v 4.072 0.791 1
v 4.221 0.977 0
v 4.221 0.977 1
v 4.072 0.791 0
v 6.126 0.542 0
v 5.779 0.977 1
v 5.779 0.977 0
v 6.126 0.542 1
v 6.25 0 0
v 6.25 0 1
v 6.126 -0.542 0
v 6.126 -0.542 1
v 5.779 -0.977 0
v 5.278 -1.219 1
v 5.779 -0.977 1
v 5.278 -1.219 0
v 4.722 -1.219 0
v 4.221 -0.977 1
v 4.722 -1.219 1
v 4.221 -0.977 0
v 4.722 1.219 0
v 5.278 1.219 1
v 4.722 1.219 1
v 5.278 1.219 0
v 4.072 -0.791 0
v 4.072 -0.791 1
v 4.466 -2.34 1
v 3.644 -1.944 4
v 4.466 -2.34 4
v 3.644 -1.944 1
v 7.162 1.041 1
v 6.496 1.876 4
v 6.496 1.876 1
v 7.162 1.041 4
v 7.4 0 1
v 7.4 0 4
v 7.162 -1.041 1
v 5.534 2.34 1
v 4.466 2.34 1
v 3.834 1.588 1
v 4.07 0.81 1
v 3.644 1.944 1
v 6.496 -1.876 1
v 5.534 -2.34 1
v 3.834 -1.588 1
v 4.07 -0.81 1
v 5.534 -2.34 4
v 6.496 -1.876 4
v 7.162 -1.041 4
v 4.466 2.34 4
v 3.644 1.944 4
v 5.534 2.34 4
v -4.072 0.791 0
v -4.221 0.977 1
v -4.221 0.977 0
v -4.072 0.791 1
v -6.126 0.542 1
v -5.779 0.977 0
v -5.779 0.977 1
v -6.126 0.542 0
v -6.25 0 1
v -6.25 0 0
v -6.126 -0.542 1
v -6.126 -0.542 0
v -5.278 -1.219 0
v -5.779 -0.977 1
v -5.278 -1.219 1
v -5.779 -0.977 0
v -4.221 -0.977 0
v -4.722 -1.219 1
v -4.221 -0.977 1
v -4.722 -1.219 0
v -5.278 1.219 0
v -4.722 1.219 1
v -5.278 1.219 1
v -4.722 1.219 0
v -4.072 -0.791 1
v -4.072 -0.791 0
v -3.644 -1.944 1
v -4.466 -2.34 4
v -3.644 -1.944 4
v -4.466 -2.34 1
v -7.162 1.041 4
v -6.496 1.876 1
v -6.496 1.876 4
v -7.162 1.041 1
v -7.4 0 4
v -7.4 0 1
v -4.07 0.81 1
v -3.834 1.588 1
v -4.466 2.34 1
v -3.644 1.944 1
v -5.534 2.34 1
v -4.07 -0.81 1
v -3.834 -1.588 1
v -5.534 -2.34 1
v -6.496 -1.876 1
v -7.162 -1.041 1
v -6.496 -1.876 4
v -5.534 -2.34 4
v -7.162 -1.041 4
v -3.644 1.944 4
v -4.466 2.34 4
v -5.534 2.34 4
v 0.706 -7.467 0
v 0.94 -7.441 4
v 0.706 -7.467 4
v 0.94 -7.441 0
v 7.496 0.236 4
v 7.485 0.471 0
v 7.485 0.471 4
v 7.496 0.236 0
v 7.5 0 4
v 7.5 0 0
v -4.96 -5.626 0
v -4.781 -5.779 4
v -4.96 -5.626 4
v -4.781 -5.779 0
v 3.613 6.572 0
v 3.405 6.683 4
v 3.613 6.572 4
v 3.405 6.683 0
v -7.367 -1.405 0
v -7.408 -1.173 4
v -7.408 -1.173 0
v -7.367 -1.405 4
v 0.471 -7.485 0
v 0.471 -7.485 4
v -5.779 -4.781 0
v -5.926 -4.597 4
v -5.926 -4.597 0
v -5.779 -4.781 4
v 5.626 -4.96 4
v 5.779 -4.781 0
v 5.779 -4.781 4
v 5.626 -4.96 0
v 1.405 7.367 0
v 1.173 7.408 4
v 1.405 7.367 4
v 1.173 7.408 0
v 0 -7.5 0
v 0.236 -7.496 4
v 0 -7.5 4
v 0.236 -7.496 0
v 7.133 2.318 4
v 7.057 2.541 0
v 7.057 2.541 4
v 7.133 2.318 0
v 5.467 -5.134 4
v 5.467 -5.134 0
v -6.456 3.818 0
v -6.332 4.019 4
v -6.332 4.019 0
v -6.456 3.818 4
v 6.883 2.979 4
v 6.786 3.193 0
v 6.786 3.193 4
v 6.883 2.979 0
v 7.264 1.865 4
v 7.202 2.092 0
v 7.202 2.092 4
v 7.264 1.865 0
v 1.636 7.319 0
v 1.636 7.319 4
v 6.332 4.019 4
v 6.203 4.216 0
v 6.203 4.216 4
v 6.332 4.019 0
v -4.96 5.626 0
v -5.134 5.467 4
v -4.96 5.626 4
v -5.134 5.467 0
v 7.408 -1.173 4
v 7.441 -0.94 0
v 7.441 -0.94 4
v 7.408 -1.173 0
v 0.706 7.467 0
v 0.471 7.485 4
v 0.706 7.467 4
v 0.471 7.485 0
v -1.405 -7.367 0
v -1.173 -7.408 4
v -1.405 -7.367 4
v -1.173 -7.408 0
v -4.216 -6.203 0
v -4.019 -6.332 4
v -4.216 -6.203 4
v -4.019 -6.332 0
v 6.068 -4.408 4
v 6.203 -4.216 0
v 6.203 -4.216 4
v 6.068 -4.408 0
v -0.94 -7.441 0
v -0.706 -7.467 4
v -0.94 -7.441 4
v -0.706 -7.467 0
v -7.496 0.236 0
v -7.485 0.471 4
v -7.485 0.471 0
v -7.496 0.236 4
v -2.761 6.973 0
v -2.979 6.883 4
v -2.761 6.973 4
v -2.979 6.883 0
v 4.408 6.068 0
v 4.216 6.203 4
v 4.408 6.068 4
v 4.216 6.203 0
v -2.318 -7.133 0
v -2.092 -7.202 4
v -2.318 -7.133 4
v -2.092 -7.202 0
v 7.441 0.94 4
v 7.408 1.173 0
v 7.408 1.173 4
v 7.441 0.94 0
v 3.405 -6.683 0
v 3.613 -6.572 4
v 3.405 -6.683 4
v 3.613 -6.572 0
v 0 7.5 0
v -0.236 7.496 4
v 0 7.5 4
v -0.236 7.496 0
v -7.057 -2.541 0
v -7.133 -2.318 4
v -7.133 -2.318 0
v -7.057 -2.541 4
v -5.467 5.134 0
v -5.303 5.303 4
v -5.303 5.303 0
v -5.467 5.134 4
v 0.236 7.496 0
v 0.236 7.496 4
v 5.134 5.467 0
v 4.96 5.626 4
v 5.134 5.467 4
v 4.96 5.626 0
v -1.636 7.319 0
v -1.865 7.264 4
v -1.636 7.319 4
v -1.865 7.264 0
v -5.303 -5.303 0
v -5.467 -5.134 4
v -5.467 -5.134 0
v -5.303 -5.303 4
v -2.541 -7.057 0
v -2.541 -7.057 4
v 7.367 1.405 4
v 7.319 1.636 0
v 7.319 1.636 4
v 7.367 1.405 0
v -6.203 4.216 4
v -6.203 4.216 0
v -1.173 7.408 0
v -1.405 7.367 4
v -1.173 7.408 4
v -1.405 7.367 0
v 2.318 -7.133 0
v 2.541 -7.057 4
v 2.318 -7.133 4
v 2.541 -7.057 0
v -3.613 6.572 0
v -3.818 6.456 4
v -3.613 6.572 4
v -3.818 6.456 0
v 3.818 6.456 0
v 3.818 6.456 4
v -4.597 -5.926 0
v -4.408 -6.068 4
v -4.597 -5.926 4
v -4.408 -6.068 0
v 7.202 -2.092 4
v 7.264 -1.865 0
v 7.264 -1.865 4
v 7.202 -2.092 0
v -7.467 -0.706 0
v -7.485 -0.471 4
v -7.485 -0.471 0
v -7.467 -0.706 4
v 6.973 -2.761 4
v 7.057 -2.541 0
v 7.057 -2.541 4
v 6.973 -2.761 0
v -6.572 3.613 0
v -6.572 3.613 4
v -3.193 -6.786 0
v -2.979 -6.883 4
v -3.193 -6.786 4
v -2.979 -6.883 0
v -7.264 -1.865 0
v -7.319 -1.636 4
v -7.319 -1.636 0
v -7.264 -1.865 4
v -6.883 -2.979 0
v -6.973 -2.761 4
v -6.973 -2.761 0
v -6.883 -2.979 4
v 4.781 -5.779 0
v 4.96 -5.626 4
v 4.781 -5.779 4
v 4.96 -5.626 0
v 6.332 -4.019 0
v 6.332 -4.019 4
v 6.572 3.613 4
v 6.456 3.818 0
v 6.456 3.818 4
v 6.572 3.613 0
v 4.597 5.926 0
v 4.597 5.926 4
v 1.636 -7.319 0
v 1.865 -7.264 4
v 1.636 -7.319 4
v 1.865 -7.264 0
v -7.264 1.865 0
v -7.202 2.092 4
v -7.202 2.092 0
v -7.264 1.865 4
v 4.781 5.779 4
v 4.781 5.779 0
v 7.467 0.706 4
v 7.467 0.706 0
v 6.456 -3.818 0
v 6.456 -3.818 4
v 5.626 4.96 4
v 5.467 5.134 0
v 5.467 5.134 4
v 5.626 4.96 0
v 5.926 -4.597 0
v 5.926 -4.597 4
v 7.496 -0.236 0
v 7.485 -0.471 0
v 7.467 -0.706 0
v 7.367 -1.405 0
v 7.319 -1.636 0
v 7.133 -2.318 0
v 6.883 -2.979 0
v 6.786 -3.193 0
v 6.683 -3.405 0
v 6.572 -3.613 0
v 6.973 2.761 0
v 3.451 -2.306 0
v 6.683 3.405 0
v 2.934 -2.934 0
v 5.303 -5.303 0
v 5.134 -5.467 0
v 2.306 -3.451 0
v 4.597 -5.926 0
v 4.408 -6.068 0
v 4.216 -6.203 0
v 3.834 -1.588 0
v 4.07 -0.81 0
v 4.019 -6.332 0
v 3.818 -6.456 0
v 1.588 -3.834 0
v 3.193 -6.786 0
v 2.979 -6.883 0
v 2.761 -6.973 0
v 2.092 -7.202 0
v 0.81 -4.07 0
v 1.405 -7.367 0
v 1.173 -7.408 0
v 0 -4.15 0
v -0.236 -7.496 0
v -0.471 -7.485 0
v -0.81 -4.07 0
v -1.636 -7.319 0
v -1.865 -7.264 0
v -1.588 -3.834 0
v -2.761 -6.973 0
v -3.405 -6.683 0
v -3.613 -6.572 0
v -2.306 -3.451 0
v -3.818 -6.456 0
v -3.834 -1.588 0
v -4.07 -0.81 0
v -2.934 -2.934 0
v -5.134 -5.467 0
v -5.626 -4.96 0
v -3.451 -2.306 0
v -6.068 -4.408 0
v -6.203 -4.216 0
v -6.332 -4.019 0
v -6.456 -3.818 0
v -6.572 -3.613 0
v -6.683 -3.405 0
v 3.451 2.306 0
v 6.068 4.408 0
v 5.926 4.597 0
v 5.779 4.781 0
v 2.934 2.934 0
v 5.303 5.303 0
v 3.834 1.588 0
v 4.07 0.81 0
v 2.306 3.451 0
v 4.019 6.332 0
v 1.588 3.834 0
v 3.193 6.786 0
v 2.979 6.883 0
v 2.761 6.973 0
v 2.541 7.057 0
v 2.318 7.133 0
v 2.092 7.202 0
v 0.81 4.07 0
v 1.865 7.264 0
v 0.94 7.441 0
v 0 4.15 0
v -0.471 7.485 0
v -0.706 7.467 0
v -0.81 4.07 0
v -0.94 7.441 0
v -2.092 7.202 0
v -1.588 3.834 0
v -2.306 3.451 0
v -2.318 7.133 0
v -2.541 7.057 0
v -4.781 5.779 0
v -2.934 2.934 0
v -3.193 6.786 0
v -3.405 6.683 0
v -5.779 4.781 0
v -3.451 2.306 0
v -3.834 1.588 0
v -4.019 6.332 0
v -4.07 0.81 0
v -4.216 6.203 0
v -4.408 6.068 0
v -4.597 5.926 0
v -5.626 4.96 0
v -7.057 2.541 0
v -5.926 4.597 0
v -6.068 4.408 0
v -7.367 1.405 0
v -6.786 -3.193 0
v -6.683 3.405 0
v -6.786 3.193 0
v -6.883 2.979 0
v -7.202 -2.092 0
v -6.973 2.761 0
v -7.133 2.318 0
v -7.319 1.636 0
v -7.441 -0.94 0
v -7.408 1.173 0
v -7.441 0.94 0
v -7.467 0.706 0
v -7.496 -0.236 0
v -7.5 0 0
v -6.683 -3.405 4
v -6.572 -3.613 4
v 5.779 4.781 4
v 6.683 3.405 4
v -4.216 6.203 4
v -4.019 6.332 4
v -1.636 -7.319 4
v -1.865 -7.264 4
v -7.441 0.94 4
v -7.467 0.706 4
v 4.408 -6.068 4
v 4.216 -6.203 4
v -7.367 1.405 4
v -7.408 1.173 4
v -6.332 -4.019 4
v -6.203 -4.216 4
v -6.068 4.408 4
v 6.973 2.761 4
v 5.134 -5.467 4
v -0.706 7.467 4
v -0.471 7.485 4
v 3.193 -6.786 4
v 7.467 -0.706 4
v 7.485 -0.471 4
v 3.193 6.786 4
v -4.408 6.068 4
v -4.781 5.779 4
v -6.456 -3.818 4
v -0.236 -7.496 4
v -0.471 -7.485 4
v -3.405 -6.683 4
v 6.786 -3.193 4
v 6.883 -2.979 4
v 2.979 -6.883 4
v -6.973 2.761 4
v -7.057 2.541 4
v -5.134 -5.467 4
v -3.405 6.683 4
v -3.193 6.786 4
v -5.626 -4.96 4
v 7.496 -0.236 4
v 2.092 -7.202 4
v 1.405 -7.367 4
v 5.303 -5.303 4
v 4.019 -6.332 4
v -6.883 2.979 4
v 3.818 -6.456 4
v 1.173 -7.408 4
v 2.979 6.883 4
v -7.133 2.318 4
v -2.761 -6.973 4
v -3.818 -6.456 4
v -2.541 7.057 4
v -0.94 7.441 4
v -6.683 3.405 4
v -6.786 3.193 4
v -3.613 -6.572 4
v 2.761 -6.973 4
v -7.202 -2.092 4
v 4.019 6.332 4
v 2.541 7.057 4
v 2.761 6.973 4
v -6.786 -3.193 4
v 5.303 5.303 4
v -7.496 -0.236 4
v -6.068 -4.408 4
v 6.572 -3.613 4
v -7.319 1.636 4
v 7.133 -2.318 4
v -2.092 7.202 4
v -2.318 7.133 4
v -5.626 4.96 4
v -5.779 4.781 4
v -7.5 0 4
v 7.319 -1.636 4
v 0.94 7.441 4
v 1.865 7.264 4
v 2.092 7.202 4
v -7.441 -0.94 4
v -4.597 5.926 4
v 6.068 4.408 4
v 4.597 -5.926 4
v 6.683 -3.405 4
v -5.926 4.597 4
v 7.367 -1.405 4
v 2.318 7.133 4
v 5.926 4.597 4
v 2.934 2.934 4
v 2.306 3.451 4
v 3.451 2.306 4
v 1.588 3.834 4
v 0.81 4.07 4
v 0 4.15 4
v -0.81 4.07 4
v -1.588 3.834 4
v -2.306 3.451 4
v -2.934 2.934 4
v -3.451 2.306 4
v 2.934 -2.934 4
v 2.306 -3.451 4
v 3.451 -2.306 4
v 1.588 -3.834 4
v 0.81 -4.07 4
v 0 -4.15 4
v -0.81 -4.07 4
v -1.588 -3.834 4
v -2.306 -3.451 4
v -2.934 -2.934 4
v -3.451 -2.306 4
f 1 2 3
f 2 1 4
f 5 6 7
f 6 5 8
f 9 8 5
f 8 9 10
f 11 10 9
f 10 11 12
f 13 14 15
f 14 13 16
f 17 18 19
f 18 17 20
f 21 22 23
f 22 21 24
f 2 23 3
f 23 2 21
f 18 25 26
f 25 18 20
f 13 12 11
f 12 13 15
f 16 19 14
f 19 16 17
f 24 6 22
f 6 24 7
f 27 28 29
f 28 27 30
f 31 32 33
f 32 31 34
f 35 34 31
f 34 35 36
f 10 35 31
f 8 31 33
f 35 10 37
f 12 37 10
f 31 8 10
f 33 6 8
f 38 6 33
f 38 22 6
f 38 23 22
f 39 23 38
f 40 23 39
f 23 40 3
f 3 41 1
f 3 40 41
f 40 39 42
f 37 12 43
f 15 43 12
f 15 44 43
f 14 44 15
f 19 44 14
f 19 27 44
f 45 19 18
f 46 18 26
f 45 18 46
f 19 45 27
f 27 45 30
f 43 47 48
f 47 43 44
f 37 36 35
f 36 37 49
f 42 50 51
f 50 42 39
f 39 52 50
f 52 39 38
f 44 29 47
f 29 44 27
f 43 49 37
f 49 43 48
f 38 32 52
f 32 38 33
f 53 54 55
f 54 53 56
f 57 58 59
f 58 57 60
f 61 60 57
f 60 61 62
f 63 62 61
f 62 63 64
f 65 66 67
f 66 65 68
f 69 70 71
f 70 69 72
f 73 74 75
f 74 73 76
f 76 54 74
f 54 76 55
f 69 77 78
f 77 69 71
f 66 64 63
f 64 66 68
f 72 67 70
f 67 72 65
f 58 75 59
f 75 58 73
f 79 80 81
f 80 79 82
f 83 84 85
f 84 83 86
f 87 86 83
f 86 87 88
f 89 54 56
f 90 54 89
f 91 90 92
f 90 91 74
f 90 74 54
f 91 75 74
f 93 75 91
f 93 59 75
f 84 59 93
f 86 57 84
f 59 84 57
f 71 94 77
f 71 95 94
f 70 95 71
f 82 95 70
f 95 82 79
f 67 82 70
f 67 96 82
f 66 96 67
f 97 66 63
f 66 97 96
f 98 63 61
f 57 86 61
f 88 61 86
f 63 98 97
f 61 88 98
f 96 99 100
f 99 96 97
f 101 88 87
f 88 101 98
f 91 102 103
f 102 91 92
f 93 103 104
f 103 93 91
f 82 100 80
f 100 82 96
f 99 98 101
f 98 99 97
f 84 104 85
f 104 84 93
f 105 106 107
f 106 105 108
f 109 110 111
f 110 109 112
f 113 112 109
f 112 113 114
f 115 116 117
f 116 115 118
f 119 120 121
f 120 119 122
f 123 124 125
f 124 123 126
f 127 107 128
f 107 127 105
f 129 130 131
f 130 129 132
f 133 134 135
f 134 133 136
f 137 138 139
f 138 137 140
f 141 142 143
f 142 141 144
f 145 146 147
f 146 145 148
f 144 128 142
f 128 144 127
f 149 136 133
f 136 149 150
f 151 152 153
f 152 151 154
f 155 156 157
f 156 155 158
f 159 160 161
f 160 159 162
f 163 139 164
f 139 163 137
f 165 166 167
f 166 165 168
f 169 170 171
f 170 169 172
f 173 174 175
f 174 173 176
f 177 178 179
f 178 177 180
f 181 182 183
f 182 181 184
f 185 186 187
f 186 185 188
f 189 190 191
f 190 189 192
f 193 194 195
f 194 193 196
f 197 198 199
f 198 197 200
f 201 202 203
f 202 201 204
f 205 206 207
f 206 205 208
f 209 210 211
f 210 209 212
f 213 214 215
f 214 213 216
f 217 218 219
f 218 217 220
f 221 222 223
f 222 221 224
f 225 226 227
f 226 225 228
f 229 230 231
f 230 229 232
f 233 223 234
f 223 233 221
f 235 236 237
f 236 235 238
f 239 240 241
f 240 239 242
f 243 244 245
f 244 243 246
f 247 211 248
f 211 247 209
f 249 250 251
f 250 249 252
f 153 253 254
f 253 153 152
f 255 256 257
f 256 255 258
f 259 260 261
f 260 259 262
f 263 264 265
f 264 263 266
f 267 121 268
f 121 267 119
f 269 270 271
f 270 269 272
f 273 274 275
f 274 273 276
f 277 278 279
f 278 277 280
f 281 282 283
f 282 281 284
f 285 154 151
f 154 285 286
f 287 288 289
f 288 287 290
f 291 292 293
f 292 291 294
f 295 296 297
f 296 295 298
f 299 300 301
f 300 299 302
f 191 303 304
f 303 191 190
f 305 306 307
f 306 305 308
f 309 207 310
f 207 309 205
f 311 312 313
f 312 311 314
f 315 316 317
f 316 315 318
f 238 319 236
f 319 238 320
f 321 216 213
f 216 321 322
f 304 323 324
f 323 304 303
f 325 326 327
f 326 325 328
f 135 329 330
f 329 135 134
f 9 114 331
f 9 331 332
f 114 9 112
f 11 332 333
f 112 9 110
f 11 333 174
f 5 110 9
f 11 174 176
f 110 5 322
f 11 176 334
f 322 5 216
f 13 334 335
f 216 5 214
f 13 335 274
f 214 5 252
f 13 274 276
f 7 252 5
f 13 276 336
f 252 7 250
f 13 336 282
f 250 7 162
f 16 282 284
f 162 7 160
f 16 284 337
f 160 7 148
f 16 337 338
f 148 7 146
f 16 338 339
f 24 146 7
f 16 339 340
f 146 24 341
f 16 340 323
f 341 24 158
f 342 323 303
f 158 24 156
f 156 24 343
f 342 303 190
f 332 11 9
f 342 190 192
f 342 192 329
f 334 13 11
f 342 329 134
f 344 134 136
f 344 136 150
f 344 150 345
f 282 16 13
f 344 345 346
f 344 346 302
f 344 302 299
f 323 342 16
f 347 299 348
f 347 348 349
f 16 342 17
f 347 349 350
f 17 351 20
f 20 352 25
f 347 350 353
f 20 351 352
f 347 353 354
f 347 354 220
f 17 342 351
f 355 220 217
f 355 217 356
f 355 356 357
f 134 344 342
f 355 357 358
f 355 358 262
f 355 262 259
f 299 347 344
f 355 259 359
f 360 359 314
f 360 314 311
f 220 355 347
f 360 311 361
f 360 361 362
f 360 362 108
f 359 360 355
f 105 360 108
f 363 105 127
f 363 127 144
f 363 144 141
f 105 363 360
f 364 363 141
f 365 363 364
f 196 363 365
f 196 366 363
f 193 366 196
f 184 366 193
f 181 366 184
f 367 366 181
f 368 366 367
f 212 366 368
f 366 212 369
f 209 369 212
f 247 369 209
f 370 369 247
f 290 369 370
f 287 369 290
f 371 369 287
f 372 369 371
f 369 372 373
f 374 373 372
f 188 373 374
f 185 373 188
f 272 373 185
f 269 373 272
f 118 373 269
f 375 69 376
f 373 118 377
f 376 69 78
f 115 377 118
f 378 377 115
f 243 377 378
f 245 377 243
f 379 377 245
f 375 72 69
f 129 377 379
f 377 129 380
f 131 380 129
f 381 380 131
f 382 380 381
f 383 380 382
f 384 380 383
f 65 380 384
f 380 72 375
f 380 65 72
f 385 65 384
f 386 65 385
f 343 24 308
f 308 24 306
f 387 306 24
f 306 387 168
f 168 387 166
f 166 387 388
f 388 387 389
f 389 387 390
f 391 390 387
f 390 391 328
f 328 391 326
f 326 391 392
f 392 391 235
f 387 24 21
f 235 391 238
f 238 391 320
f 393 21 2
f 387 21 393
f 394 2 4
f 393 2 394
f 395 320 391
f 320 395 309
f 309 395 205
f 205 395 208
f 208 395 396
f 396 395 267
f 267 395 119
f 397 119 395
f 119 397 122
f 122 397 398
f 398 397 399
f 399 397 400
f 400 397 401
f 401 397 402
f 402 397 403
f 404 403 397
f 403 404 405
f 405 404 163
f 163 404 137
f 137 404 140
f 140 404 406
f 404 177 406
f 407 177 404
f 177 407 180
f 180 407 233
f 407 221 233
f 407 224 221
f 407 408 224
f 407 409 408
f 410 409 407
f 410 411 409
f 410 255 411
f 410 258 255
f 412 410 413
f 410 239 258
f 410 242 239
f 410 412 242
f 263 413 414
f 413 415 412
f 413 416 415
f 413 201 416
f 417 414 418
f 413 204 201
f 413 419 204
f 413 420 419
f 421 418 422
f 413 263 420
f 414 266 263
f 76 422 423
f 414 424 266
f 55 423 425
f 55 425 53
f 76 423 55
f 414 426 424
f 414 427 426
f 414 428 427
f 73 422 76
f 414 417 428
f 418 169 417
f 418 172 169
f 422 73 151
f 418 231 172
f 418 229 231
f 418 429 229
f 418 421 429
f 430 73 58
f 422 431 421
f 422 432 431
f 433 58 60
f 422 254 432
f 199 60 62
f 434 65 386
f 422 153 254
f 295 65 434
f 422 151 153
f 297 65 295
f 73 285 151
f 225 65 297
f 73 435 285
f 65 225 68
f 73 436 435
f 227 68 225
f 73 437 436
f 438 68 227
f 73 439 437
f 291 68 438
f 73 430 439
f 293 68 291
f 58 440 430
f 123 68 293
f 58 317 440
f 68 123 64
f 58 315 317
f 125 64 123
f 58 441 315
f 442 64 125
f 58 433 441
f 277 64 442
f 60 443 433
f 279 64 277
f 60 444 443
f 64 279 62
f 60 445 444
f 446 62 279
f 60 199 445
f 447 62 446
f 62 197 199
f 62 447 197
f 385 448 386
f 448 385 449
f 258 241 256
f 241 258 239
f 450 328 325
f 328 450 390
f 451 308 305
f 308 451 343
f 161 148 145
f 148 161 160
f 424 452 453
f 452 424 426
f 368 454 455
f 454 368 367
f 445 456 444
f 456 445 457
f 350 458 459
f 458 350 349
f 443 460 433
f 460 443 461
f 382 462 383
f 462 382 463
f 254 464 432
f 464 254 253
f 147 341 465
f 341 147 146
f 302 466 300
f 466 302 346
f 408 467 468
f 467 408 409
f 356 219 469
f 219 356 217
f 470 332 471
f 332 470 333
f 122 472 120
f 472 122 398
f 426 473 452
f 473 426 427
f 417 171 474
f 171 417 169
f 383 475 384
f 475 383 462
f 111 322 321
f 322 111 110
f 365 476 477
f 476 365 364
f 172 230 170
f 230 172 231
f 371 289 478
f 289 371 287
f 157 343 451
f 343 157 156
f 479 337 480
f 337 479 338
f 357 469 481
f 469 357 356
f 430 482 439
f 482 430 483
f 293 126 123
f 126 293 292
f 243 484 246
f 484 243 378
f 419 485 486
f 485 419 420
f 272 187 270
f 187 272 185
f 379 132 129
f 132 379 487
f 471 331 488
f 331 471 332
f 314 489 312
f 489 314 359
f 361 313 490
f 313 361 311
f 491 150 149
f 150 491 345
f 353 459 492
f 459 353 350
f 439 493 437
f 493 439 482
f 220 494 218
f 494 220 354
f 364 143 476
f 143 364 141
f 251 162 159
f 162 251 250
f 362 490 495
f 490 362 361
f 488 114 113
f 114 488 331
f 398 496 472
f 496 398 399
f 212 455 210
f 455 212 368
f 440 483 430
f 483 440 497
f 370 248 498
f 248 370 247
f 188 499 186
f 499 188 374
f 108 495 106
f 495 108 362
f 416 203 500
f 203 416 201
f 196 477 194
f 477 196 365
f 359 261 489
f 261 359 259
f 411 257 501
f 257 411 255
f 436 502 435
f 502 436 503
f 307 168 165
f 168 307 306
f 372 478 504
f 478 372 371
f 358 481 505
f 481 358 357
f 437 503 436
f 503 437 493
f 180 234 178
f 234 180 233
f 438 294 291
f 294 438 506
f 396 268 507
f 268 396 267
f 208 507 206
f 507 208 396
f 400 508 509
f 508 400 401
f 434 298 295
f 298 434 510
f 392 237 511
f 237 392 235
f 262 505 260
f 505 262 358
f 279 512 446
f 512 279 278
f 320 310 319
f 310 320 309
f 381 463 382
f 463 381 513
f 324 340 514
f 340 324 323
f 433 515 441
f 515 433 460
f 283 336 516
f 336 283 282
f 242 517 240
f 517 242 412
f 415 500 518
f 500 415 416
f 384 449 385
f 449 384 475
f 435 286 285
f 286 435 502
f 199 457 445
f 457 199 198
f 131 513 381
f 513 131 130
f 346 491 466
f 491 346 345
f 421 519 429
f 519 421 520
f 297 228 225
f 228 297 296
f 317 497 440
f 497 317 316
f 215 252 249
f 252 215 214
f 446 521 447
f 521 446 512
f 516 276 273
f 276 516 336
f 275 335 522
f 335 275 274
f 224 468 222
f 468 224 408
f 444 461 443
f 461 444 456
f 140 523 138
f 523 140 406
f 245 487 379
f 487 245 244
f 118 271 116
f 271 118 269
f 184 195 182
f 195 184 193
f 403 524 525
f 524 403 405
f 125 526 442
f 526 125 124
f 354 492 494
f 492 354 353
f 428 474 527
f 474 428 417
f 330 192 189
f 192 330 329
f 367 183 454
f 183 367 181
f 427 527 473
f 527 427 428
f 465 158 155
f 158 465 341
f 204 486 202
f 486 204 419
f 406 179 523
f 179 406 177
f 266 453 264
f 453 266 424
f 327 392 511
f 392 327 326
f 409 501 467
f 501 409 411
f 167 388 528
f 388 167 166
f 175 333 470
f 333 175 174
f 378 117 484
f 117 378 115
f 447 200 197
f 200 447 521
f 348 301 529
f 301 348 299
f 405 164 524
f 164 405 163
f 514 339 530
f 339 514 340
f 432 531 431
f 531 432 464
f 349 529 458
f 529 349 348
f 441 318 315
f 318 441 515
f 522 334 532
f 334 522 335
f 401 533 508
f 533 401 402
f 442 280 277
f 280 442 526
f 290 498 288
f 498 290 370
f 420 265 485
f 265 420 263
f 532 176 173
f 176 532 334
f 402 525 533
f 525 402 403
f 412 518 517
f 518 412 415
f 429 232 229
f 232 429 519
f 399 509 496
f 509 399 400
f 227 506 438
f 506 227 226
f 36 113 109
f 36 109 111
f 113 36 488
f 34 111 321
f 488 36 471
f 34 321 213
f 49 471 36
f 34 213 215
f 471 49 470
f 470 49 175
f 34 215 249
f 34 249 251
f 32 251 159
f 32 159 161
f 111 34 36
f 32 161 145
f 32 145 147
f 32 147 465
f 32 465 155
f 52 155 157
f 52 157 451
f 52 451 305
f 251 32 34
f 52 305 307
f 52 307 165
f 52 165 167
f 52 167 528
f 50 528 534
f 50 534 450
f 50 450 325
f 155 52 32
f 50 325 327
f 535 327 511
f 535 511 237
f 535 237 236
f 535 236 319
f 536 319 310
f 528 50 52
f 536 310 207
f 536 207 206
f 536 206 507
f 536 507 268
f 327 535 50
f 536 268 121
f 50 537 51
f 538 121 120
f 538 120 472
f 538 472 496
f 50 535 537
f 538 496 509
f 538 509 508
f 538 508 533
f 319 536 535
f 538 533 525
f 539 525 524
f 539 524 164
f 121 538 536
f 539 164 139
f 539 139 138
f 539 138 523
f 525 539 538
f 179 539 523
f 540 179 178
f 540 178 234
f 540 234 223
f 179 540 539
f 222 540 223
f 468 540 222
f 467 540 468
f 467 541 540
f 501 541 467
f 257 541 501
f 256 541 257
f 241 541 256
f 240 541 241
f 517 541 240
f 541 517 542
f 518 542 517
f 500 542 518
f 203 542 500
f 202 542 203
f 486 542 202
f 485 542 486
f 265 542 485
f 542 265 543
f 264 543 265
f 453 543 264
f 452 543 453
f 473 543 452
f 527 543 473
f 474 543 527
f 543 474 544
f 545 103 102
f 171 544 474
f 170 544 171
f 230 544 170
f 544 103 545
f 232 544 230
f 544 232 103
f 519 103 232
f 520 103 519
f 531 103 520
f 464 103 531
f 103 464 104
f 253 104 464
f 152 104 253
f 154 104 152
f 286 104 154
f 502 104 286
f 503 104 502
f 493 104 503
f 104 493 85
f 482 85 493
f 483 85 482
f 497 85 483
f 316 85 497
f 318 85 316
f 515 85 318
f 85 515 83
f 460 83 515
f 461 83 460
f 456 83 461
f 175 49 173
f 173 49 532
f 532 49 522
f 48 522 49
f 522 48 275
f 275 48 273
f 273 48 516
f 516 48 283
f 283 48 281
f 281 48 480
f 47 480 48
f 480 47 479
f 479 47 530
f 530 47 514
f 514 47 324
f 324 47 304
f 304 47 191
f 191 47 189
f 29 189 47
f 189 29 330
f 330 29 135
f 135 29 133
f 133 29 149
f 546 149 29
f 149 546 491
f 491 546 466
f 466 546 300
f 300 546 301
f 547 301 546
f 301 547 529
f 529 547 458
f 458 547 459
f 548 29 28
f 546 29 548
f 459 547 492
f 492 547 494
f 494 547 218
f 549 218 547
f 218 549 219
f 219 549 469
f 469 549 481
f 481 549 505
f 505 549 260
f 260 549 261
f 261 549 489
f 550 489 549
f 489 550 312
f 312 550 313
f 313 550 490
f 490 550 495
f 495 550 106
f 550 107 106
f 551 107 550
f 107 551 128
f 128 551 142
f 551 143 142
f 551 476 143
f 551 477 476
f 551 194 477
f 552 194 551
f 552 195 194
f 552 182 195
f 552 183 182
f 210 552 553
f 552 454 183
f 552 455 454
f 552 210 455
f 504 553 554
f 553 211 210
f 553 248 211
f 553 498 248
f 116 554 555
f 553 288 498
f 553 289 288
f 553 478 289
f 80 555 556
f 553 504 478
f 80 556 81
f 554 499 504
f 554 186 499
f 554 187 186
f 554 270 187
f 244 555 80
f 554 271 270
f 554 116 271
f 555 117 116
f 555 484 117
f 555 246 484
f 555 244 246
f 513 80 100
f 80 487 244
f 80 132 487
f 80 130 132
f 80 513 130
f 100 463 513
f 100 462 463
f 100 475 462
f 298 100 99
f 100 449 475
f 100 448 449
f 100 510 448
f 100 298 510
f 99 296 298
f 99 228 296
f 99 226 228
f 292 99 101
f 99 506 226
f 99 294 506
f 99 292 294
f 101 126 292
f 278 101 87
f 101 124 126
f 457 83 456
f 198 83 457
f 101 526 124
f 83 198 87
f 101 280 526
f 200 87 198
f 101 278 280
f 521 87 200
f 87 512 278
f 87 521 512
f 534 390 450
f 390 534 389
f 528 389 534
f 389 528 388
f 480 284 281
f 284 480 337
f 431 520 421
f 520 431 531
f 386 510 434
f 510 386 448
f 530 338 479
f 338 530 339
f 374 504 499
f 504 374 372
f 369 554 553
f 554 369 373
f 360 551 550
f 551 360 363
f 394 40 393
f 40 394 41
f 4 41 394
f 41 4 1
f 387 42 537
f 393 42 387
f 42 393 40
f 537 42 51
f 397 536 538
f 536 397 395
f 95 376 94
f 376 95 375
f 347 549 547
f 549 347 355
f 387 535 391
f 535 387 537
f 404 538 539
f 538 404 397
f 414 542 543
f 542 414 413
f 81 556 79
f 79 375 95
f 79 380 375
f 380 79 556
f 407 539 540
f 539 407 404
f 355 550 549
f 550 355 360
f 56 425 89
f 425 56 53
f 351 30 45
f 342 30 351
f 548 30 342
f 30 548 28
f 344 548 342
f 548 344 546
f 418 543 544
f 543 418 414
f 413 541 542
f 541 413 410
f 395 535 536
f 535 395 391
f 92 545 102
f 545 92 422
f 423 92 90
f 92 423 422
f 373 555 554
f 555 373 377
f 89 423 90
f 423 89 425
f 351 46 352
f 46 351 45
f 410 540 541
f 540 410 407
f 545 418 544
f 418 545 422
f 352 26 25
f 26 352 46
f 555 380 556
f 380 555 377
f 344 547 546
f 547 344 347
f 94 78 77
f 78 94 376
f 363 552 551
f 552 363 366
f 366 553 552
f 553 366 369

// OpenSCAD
use <../libs/illumination.scad>

condenser_led_holder_stl();

module condenser_led_holder_stl(){
    condenser_led_holder(led_r=7.8/2);
}
